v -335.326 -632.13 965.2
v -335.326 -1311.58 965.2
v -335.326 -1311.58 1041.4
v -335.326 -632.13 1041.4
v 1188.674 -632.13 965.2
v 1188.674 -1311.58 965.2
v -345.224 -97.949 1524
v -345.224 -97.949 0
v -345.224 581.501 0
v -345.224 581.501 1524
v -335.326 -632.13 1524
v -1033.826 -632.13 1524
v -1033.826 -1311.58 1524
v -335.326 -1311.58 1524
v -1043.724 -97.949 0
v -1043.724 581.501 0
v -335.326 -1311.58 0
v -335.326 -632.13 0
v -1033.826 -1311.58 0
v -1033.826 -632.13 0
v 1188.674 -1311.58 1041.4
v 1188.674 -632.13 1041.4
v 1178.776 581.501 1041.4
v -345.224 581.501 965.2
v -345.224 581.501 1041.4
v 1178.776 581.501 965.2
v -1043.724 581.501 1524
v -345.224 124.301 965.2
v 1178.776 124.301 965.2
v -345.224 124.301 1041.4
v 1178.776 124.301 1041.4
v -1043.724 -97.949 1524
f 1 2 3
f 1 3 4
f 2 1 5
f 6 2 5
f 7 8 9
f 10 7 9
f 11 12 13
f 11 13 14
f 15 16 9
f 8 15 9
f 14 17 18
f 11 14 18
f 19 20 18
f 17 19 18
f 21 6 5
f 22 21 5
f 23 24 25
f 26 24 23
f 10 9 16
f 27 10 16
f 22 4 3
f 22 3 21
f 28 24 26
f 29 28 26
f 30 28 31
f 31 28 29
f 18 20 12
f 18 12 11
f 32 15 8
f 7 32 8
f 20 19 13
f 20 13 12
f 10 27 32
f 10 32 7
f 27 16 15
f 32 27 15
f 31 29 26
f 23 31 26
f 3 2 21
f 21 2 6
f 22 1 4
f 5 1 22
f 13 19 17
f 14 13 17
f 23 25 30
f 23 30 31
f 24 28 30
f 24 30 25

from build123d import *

# Parameters (mm, degrees)
F1_START = 965.2
F0_W     = 1524
F0_H     = 679.45
F1_DEPTH = 76.2
F0_H_2   = 457.2
F0_W_2   = 698.5
F2_DEPTH = 1524


with BuildPart() as f1:
    # F0 (on Top) → F1 (new body)
    with BuildSketch(Plane.XY.offset(F1_START)):
        with Locations((426.6736479466, -971.8554207087)):
            Rectangle(F0_W, F0_H)
    extrude(amount=F1_DEPTH)


with BuildPart() as f1b:
    # F0 (on Top) → F1, piece 2 (new body)
    with BuildSketch(Plane.XY.offset(F1_START)):
        with Locations((416.7758880812, 352.9013210833)):
            Rectangle(F0_W, F0_H_2)
    extrude(amount=F1_DEPTH)


with BuildPart() as f2:
    # F0 (on Top) → F2 (new body)
    with BuildSketch(Plane.XY):
        with Locations((-684.5763520534, -971.8554207087)):
            Rectangle(F0_W_2, F0_H)
    extrude(amount=F2_DEPTH)


with BuildPart() as f2b:
    # F0 (on Top) → F2, piece 2 (new body)
    with BuildSketch(Plane.XY):
        Polygon((-345.2241119188, 581.5013210833), (-1043.7241119188, 581.5013210833), (-1043.7241119188, -97.9486789167), (-345.2241119188, -97.9486789167), (-345.2241119188, 124.3013210833), align=None)
    extrude(amount=F2_DEPTH)


solid = Compound([f1.part, f1b.part, f2.part, f2b.part])
